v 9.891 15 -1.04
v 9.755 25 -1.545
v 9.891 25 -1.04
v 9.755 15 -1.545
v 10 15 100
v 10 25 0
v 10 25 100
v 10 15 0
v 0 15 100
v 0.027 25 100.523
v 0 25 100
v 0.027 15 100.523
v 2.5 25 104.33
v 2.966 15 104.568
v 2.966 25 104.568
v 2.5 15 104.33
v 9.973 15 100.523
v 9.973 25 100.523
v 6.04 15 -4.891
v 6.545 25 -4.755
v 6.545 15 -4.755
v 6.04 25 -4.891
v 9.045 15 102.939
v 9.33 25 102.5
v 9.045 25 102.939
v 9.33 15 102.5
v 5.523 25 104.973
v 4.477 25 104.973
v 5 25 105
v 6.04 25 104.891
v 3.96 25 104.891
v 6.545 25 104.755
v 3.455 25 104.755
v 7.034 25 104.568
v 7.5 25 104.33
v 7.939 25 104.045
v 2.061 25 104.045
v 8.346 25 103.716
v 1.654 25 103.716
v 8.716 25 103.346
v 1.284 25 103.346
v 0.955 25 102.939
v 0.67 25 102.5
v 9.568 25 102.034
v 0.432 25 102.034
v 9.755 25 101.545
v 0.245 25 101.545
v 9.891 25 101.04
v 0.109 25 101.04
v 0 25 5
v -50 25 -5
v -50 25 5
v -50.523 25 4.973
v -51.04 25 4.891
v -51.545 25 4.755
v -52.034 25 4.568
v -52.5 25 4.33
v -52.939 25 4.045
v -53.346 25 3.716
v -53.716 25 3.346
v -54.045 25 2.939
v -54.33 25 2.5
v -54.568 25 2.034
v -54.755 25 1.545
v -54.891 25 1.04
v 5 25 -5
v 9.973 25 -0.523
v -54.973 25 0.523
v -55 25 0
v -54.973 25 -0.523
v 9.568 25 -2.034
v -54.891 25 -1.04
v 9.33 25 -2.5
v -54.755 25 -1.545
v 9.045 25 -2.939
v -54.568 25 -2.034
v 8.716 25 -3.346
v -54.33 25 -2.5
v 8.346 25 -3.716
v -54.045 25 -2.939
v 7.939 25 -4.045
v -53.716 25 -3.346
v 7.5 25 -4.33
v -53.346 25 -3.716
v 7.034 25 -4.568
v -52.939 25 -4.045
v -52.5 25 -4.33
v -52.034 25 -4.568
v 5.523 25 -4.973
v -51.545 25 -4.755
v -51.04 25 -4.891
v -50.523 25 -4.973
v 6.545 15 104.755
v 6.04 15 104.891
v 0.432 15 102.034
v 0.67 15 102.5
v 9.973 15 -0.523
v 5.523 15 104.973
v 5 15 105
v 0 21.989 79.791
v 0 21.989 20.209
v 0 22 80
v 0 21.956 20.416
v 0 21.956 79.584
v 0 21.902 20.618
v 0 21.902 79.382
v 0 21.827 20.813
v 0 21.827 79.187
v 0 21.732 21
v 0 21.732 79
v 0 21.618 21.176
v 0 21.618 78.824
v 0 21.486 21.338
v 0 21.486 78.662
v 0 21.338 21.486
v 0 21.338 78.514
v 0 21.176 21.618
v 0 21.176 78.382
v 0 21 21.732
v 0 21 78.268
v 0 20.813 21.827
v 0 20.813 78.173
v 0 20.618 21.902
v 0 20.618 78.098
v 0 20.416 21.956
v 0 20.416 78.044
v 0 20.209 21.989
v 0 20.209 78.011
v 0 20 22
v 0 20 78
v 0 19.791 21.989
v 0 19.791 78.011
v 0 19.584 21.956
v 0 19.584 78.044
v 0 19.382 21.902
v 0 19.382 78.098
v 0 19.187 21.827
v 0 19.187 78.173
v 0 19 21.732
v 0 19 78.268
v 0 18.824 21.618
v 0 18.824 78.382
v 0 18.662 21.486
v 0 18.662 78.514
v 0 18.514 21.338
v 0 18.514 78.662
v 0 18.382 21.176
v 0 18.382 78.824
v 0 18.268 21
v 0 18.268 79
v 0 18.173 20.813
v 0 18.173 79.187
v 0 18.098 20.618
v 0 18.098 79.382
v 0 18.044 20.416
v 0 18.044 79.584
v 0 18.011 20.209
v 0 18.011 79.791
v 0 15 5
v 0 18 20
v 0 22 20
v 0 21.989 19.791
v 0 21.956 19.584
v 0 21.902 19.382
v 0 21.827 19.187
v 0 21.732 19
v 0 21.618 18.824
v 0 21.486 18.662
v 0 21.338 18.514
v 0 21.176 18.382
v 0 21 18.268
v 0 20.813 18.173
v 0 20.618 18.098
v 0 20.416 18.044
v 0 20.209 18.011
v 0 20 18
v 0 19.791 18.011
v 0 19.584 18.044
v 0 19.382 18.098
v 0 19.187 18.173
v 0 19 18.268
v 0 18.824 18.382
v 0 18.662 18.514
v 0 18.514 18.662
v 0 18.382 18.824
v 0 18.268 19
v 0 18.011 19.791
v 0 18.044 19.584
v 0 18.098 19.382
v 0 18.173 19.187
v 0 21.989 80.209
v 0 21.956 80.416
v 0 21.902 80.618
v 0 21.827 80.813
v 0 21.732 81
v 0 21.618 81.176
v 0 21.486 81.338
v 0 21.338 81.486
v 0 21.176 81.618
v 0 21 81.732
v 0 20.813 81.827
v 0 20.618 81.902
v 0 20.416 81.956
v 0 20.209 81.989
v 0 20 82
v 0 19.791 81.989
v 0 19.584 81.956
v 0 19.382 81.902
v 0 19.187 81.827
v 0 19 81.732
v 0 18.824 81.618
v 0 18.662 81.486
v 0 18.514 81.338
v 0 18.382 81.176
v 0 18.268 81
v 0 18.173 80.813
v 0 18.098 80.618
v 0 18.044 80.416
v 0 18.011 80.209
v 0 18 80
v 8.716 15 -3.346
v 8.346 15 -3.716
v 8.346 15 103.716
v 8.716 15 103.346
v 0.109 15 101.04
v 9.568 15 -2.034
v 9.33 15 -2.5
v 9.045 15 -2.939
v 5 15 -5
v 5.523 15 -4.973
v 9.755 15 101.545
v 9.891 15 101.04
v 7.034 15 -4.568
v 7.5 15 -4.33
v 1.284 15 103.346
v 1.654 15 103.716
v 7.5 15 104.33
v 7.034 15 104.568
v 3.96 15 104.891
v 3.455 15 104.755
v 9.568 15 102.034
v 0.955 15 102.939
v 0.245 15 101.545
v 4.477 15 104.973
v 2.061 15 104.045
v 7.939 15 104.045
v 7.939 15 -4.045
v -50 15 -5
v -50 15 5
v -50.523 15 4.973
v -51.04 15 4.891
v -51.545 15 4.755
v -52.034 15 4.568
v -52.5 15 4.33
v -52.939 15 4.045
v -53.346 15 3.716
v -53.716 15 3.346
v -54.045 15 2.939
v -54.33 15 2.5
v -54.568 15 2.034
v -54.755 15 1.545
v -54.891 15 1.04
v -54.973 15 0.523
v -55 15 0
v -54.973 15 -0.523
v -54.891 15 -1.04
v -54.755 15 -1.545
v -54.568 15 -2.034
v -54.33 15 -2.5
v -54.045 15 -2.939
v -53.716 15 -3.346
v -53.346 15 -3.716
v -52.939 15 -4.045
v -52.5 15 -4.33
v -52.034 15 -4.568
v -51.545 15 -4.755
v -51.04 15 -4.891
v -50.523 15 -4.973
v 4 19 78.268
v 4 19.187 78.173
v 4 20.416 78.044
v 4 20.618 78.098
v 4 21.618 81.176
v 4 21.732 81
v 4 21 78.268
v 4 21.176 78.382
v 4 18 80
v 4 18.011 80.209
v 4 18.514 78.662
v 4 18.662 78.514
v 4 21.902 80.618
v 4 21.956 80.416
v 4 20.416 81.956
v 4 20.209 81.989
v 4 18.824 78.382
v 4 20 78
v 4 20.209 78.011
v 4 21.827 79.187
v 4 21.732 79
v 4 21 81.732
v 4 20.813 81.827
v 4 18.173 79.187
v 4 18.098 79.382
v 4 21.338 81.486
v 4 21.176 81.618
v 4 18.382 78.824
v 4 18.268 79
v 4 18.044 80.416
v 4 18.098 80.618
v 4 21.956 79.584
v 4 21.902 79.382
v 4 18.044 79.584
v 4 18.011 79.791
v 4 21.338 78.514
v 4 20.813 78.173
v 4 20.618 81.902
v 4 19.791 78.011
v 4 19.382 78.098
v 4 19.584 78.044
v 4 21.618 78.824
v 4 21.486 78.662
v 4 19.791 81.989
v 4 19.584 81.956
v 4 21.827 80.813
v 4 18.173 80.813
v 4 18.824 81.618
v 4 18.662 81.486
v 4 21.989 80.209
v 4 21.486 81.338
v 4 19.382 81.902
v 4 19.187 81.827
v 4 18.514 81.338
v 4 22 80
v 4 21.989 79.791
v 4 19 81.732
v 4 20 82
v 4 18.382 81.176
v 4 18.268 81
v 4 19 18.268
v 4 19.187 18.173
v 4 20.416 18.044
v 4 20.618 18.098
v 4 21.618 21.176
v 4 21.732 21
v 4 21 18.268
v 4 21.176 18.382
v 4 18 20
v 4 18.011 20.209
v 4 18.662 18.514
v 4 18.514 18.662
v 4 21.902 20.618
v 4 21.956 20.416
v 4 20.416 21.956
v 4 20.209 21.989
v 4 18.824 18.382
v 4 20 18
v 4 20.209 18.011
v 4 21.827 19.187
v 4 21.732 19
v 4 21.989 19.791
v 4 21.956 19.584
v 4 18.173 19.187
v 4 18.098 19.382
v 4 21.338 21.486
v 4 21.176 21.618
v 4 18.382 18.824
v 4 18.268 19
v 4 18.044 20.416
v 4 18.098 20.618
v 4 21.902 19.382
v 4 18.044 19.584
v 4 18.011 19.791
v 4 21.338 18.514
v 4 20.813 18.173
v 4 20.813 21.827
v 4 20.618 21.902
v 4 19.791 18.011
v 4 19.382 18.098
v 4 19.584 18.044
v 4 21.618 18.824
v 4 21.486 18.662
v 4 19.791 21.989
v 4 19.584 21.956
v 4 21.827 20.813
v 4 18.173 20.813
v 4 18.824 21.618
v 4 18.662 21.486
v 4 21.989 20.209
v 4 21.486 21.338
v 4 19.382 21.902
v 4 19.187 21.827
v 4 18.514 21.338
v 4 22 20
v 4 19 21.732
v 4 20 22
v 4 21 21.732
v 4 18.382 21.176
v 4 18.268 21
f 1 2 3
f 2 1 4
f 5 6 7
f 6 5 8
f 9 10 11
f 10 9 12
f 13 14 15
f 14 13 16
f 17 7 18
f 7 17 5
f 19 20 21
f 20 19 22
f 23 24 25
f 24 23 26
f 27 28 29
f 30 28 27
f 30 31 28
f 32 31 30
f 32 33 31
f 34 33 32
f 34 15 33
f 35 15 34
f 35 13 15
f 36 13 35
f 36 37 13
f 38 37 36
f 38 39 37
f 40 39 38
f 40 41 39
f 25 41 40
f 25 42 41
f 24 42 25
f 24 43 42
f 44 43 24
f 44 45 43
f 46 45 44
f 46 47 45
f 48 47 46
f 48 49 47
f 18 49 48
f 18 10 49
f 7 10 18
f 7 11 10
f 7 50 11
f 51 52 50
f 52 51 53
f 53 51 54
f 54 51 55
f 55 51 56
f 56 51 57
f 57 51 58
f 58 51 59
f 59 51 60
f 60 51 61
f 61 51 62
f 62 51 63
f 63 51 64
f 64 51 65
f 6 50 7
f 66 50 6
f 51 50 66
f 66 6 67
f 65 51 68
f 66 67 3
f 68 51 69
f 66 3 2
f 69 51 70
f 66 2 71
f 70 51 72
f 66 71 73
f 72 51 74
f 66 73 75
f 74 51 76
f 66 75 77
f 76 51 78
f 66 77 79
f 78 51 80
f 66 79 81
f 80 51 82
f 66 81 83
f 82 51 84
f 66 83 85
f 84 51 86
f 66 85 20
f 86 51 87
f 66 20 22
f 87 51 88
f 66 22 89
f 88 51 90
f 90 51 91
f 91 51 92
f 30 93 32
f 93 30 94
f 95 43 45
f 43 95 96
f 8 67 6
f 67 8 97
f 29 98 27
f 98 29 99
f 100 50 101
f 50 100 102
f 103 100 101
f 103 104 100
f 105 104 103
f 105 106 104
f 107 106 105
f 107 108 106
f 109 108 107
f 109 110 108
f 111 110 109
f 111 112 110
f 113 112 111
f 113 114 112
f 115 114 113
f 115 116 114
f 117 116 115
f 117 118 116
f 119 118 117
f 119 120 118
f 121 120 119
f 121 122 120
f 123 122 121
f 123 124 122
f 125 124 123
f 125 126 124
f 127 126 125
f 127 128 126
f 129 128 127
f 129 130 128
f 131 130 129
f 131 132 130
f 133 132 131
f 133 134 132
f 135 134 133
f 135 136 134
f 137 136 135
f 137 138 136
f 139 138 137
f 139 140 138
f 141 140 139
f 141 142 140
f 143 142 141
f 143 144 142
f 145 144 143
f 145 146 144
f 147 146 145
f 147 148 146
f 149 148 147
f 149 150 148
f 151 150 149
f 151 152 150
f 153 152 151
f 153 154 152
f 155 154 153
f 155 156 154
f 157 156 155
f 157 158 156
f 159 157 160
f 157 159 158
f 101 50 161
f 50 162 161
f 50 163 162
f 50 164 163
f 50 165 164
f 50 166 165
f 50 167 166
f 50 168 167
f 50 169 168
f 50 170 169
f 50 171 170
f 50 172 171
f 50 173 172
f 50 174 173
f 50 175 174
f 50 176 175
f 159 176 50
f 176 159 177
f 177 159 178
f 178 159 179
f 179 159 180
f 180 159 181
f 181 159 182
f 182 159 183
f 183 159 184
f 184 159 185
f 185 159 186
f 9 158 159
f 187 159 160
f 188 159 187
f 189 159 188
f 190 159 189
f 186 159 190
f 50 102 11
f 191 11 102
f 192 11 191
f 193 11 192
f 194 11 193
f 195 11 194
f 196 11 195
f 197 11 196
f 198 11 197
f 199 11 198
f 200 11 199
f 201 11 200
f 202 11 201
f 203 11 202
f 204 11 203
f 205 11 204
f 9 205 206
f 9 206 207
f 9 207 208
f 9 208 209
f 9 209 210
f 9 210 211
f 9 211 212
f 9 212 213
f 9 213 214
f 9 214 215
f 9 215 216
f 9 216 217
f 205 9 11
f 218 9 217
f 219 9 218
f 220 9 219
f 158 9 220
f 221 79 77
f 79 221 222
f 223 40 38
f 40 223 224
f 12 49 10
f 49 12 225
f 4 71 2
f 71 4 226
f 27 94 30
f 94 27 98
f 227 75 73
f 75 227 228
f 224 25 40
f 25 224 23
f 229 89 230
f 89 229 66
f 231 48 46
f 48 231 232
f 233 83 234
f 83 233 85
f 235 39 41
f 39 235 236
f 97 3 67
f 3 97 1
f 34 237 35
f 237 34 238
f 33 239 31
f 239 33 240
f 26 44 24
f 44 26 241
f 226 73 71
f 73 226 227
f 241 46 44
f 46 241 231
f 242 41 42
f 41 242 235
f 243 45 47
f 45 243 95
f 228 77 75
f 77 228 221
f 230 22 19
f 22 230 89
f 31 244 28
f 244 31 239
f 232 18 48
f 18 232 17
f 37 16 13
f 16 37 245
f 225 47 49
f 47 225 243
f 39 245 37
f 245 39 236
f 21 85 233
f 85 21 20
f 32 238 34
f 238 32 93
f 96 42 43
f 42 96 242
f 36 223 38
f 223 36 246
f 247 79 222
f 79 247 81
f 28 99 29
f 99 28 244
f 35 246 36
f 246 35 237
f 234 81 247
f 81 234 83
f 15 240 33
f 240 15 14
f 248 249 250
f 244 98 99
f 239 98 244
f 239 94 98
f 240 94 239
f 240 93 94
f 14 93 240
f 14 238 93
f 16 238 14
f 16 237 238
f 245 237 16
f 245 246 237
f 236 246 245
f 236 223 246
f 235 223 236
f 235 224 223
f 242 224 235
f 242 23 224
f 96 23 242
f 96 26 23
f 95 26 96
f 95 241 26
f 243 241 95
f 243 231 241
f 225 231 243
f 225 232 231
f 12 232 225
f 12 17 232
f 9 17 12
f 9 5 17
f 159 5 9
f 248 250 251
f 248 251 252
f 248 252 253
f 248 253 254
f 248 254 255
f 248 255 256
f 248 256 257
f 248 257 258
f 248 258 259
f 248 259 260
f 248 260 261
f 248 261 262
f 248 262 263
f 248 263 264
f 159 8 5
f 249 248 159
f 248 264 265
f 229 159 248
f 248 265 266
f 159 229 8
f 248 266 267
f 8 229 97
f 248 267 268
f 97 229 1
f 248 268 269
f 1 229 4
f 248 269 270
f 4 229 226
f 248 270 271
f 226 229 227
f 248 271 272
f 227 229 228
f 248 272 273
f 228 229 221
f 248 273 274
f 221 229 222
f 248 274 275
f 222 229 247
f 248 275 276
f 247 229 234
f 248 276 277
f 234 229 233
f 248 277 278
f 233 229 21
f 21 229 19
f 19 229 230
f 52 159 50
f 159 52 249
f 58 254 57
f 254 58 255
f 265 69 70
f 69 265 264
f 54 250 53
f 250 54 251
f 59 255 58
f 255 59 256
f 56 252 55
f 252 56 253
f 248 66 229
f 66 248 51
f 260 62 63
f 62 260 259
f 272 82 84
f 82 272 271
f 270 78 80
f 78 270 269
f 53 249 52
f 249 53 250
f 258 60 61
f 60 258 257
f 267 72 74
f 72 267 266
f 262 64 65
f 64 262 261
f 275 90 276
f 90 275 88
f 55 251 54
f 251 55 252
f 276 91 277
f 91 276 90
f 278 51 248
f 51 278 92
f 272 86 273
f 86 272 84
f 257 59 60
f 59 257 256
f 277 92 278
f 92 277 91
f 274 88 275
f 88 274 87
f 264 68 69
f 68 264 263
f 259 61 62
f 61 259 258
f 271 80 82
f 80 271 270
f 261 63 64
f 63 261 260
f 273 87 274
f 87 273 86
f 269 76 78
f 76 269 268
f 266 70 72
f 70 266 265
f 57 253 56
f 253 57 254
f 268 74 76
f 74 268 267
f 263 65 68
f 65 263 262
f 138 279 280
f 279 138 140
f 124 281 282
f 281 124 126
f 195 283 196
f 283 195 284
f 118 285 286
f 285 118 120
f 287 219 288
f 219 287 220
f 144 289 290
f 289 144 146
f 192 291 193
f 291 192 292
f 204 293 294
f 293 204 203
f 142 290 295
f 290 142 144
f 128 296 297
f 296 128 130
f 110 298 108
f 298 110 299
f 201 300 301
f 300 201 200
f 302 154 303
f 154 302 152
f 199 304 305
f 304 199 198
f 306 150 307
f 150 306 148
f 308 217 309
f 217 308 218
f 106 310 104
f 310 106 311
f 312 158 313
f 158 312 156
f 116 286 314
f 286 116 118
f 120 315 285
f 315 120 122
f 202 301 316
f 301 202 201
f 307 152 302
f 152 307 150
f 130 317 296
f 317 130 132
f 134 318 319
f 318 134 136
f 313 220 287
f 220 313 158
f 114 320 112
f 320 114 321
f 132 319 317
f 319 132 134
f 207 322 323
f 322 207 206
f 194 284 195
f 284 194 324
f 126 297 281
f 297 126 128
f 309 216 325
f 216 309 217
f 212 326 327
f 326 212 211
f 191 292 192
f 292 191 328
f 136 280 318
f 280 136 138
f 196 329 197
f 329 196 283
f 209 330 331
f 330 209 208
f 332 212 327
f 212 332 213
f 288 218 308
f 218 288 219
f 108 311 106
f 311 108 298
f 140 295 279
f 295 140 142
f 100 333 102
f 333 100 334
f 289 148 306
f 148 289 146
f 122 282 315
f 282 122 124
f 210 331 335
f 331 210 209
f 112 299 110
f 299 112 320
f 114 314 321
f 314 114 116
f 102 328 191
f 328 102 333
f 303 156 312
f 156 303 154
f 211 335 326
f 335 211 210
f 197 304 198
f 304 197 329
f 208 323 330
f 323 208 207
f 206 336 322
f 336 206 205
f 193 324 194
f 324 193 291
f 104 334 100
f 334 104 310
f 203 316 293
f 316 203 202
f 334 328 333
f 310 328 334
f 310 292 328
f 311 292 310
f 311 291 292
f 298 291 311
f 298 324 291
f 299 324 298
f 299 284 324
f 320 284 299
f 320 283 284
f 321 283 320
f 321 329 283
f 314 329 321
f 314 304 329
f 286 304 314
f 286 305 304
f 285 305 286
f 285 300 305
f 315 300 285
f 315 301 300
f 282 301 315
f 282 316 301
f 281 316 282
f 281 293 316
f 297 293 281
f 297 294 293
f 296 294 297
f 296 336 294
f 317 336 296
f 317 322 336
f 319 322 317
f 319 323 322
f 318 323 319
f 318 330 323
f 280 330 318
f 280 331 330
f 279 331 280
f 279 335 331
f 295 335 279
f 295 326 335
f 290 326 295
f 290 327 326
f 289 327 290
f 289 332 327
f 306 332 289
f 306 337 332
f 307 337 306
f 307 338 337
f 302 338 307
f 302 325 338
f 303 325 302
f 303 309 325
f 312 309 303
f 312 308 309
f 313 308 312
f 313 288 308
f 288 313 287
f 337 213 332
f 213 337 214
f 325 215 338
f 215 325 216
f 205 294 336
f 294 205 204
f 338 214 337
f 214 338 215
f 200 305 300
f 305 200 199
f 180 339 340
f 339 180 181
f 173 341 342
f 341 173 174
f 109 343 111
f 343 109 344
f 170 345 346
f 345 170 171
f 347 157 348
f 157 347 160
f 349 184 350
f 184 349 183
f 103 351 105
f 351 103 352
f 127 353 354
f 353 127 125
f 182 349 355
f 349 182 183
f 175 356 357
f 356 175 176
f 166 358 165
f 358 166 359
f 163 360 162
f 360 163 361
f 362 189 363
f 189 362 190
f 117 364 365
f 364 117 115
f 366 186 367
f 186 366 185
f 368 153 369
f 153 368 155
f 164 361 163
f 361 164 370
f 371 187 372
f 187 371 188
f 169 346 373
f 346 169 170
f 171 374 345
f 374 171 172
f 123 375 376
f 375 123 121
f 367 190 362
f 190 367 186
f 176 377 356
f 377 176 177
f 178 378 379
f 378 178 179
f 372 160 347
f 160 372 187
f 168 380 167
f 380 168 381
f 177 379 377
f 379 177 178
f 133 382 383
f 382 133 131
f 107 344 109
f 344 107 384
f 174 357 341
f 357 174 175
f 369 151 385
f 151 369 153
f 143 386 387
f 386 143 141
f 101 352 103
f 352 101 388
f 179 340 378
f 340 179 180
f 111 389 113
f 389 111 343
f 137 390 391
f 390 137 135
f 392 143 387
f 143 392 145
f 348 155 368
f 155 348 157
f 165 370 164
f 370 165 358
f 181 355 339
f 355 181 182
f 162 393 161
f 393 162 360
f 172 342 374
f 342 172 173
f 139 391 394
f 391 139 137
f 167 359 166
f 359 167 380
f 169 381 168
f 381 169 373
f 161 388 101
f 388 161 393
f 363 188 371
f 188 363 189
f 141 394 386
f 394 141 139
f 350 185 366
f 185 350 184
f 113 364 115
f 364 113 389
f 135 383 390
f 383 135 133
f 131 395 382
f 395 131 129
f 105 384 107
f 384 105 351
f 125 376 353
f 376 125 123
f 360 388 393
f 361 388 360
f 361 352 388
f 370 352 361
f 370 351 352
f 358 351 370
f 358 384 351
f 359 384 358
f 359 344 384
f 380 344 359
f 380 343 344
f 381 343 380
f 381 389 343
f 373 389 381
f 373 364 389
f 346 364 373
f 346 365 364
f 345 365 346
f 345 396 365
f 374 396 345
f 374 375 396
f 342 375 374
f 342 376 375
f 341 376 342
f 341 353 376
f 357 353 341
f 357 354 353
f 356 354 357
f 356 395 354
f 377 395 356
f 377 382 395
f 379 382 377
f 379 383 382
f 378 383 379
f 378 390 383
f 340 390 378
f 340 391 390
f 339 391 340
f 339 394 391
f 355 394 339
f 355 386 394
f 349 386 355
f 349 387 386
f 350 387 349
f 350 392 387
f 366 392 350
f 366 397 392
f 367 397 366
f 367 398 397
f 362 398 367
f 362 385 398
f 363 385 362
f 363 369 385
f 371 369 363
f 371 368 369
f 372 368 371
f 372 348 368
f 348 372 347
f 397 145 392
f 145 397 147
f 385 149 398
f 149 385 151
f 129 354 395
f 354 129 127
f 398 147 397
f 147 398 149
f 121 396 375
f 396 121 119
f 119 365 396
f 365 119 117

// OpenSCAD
// file: ../Household/references.scad
// Size
//Naming
// _PT = printable
// _ES = exact size
// _IS = insertable with force but no gaps

//--------------cables  (CB)

//----Ethernet (rj45)

//not mesured yet
CB_RJ45_Diameter_ES=4; 

//--------------threaded rod  (TR)

//----M5

TR_M5_Diameter_ES = 5.8;
//for a hole 
TR_M5_Diamater_IS = 6;
TR_M5_Diamater_PT = 7;


//----M10

TR_M10_Diameter_ES = 9.6;
//for a hole 
TR_M10_Diamater_IS = 10;
TR_M10_Diamater_PT = 12;

//--------------Screw (SC)
//----M3

module body_M3(height_input){
    cylinder(d=SC_M3_Diameter_PT,h=height_input,$fn=60);
    
    }

module body_M5(height_input){
    cylinder(d=SC_M5_Diameter_PT,h=height_input,$fn=60);
    
    }
    
SC_M3_Diameter_ES = 2.96;
SC_M3_Head_Diameter_ES = 5.90;
SC_M3_Head_Height_ES = 2.32;
//for a hole 
SC_M3_Diameter_PT = 4; 


//----M5

SC_M5_Diameter_ES = 4.86;
SC_M5_Head_Diameter_ES = 9.24;
SC_M5_Head_Height_ES = 3.0;
//for a hole 
SC_M5_Diameter_IS = 5;
SC_M5_Diameter_PT = 5.2; //inconnu pour le moment
SC_M5_Head_Diameter_PT = 11;

//--------------Nut Bolt (NB)

module nut_M3(height_input){
    cylinder(d=NB_M3_Diameter_C2C_PT,h=height_input,$fn=6);
    
    }

//----M3
// Side to side = from 2 paralelle faces S2S
// corner to corner = from 2 corners C2C


NB_M3_Diameter_S2S_ES = 5.30;
NB_M3_Diameter_C2C_ES = 6.0;

NB_M3_Diameter_S2S_PT = 6.30; //reducing as well
NB_M3_Diameter_C2C_PT = 7.0; //8.0 was too much 


//--------------Zip ties (ZT)

//Big zip ties I got    

ZT_length_ES = 300;
ZT_width_ES = 4.8;
ZT_height_ES = 1;

ZT_width_PT = 7;
ZT_height_PT = 3;

//--------------Velcro tape (VT)



VT_length_ES = 300;
VT_width_ES = 20;
VT_height_ES = 1;

VT_width_PT = 22;
VT_height_PT = 3;



//--------------Switch (SW)
//switch from castorama 
SW_length_ES = 13;
SW_width_ES = 8;
SW_height_ES = 14;

SW_length_PT = 15;
SW_width_PT = 10;
SW_height_PT = 16;


//switch from aliexpress
SW_AL_tube_width_ES = 5.7;
SW_AL_tube_width_PT = 7;

module custom_cylinder_switch(translated_position_X, translated_position_Y,translated_position_Z,heigh_input) {
    translate([translated_position_X, translated_position_Y, translated_position_Z]){ 
        rotate([90,0,0]){
            cylinder(d=SW_AL_tube_width_PT, h=heigh_input, $fn=30);
        }
    }
}
module custom_cylinder(rotate_input,translate_input,diameter_object,height_object){
    translate(translate_input){
        rotate(rotate_input){
            cylinder(d=diameter_object,h=height_object,$fn=60);
        }
    }
}

//--------------generic connectors (GC)
// USB C (USB-C)
GC_USB_C_length_ES = 7.3;
GC_USB_C_width_ES = 8.8;
GC_USB_C_height_ES = 3;

module USB_C(rotate_input,translate_input){
    translate(translate_input){
    rotate(rotate_input){
        hull(){
    cylinder(d=GC_USB_C_height_ES,h=GC_USB_C_length_ES,$fn=60);
translate([0,GC_USB_C_width_ES-GC_USB_C_height_ES,0]){
    cylinder(d=GC_USB_C_height_ES,h=GC_USB_C_length_ES,$fn=60);
}
}
    }
}
}

//--------------battery from vapes (BV)

//vapes crystal pro battery (CP)
BV_CP_length_ES = 34;
BV_CP_width_ES = 20;
BV_CP_height_ES = BV_CP_width_ES; //(because it's a cylinder)

BV_CP_length_PT = 37;
BV_CP_width_PT = 22;
BV_CP_height_PT = BV_CP_width_ES; //(because it's a cylinder)

//dimension list [legnth, width, height]
//BV_CP_PT=[37,22,22];
BV_CP_PT=[BV_CP_length_PT,BV_CP_width_PT,BV_CP_height_PT];

module vapes_battery(input_list,rotate_input,translate_input){
translate(translate_input){
    rotate(rotate_input){
        color("green")cylinder(d=input_list[1],h=input_list[0],$fn=60);
    }
    }
}


//--------------battery charger (BC)
//Board Charger TP4056 Module  (TP)

//https://www.az-delivery.uk/cdn/shop/products/tp4056-batterieladungsmodul-usb-typ-c-schutzschaltung-led-anzeigen-fur-ihre-li-ion-oder-lipo-einzelzellenbatterien-126337.jpg?v=1694708173


BC_TP_length_ES = 28;
BC_TP_full_length_ES = 28; //usb C end included
BC_TP_width_ES = 17;
BC_TP_height_ES = 1.3; //without USB C
BC_TP_full_height_ES = 5; //with USB C



//usb C connector position
BC_TP_width_from_side_ES = 8.44;//center of USB C connector from bottom (view from the top )
BC_TP_height_from_bottom_ES = 3.4;//center of USB C connector from bottom (view from the top )
BC_TP_negative_length_ES = 2;//center of USB C connector from bottom 

module battery_charger(rotate_input,translate_input){
    translate(translate_input){
    rotate(rotate_input){
        color("green"){
            cube([BC_TP_full_length_ES,BC_TP_width_ES,BC_TP_height_ES]);

                rotate_array_USB_C=[0,90,0];
    translate_array_USB_C=[-BC_TP_negative_length_ES,BC_TP_width_ES/2-(GC_USB_C_width_ES-GC_USB_C_height_ES)/2,GC_USB_C_height_ES/2+BC_TP_height_ES];
    
    USB_C(rotate_array_USB_C,translate_array_USB_C);

            
            }
    }
}
    
    }


//https://www.alectrofag.co.uk/cdn/shop/files/Hayati_Pro_Max_4000_Puffs_Disposable_Vape.jpg?v=1725012272




//https://d138zd1ktt9iqe.cloudfront.net/media/seo_landing_files/length-width-height-01-1646654708.png
// main file
include <../Household/references.scad>

length_carriage_plate=50;
width_carriage_plate=3;
height_carriage_plate=100;

    
length_leg_part=10;
width_leg_part=10;
height_leg_part=100;
depth_leg_part=50;
    

module holes_for_nuts(){
    color("green"){
    //position nuts 

    //top left
    position_nut_1 = [0,20,80];

    //top right
    position_nut_2 = [0,40,80];

    //bottom left
    position_nut_3 = [0,20,20];

    //bottom right
    position_nut_4 = [0,40,20];

    rotate_nuts=[0,90,0];

    for (i = [position_nut_1,position_nut_2,position_nut_3,position_nut_4]){
        custom_cylinder(
            rotate_input=rotate_nuts,
            translate_input=i,
            diameter_object=4,
            height_object=4);
    }
}
}

module leg_part(){

    //top circle 
    rotate_leg_top_part=[90,0,0];
        
    //top left
    position_leg_top = [width_leg_part/2,20+length_leg_part/2,height_leg_part];

    //top right
    position_leg_bottom = [width_leg_part/2,20+length_leg_part/2,0];

    //bottom left
    position_leg_depth = [-depth_leg_part,20+length_leg_part/2,0];
    
    hull(){
        custom_cylinder(
            rotate_input=rotate_leg_top_part,
            translate_input=position_leg_top,
            diameter_object=width_leg_part,
            height_object=length_leg_part);    

        custom_cylinder(
            rotate_input=rotate_leg_top_part,
            translate_input=position_leg_bottom,
            diameter_object=width_leg_part,
            height_object=length_leg_part);    
    }
    hull(){
        custom_cylinder(
            rotate_input=rotate_leg_top_part,
            translate_input=position_leg_bottom,
            diameter_object=width_leg_part,
            height_object=length_leg_part);    

        custom_cylinder(
            rotate_input=rotate_leg_top_part,
            translate_input=position_leg_depth,
            diameter_object=width_leg_part,
            height_object=length_leg_part);    
    }
}

module holes_for_fixation(){
    color("blue"){
        //position nuts 

    //top left
    position_hole_fixation_1 = [0,20,90];

    //top right
    position_hole_fixation_2 = [0,20,50];

    position_hole_fixation_3 = [0,20,10];

    rotate_nuts=[0,90,0];

    for (i = [position_hole_fixation_1,position_hole_fixation_2,position_hole_fixation_3]){
        custom_cylinder(
            rotate_input=rotate_nuts,
            translate_input=i,
            diameter_object=4,
            height_object=width_leg_part);
    }}
    }


module holes_for_stealthburner(){
    color("red"){
        //position nuts 

    //top left
    position_hole_SB_1 = [0,20,80];

    //top right
    position_hole_SB_2 = [0,40,80];

    rotate_nuts=[0,90,0];

    for (i = [position_hole_SB_1,position_hole_SB_2]){
        custom_cylinder(
            rotate_input=rotate_nuts,
            translate_input=i,
            diameter_object=4,
            height_object=4);
    }}
    }

module main(){
    difference(){
        leg_part();
        holes_for_nuts();
    }
    holes_for_fixation();
    }
    
    
main();
